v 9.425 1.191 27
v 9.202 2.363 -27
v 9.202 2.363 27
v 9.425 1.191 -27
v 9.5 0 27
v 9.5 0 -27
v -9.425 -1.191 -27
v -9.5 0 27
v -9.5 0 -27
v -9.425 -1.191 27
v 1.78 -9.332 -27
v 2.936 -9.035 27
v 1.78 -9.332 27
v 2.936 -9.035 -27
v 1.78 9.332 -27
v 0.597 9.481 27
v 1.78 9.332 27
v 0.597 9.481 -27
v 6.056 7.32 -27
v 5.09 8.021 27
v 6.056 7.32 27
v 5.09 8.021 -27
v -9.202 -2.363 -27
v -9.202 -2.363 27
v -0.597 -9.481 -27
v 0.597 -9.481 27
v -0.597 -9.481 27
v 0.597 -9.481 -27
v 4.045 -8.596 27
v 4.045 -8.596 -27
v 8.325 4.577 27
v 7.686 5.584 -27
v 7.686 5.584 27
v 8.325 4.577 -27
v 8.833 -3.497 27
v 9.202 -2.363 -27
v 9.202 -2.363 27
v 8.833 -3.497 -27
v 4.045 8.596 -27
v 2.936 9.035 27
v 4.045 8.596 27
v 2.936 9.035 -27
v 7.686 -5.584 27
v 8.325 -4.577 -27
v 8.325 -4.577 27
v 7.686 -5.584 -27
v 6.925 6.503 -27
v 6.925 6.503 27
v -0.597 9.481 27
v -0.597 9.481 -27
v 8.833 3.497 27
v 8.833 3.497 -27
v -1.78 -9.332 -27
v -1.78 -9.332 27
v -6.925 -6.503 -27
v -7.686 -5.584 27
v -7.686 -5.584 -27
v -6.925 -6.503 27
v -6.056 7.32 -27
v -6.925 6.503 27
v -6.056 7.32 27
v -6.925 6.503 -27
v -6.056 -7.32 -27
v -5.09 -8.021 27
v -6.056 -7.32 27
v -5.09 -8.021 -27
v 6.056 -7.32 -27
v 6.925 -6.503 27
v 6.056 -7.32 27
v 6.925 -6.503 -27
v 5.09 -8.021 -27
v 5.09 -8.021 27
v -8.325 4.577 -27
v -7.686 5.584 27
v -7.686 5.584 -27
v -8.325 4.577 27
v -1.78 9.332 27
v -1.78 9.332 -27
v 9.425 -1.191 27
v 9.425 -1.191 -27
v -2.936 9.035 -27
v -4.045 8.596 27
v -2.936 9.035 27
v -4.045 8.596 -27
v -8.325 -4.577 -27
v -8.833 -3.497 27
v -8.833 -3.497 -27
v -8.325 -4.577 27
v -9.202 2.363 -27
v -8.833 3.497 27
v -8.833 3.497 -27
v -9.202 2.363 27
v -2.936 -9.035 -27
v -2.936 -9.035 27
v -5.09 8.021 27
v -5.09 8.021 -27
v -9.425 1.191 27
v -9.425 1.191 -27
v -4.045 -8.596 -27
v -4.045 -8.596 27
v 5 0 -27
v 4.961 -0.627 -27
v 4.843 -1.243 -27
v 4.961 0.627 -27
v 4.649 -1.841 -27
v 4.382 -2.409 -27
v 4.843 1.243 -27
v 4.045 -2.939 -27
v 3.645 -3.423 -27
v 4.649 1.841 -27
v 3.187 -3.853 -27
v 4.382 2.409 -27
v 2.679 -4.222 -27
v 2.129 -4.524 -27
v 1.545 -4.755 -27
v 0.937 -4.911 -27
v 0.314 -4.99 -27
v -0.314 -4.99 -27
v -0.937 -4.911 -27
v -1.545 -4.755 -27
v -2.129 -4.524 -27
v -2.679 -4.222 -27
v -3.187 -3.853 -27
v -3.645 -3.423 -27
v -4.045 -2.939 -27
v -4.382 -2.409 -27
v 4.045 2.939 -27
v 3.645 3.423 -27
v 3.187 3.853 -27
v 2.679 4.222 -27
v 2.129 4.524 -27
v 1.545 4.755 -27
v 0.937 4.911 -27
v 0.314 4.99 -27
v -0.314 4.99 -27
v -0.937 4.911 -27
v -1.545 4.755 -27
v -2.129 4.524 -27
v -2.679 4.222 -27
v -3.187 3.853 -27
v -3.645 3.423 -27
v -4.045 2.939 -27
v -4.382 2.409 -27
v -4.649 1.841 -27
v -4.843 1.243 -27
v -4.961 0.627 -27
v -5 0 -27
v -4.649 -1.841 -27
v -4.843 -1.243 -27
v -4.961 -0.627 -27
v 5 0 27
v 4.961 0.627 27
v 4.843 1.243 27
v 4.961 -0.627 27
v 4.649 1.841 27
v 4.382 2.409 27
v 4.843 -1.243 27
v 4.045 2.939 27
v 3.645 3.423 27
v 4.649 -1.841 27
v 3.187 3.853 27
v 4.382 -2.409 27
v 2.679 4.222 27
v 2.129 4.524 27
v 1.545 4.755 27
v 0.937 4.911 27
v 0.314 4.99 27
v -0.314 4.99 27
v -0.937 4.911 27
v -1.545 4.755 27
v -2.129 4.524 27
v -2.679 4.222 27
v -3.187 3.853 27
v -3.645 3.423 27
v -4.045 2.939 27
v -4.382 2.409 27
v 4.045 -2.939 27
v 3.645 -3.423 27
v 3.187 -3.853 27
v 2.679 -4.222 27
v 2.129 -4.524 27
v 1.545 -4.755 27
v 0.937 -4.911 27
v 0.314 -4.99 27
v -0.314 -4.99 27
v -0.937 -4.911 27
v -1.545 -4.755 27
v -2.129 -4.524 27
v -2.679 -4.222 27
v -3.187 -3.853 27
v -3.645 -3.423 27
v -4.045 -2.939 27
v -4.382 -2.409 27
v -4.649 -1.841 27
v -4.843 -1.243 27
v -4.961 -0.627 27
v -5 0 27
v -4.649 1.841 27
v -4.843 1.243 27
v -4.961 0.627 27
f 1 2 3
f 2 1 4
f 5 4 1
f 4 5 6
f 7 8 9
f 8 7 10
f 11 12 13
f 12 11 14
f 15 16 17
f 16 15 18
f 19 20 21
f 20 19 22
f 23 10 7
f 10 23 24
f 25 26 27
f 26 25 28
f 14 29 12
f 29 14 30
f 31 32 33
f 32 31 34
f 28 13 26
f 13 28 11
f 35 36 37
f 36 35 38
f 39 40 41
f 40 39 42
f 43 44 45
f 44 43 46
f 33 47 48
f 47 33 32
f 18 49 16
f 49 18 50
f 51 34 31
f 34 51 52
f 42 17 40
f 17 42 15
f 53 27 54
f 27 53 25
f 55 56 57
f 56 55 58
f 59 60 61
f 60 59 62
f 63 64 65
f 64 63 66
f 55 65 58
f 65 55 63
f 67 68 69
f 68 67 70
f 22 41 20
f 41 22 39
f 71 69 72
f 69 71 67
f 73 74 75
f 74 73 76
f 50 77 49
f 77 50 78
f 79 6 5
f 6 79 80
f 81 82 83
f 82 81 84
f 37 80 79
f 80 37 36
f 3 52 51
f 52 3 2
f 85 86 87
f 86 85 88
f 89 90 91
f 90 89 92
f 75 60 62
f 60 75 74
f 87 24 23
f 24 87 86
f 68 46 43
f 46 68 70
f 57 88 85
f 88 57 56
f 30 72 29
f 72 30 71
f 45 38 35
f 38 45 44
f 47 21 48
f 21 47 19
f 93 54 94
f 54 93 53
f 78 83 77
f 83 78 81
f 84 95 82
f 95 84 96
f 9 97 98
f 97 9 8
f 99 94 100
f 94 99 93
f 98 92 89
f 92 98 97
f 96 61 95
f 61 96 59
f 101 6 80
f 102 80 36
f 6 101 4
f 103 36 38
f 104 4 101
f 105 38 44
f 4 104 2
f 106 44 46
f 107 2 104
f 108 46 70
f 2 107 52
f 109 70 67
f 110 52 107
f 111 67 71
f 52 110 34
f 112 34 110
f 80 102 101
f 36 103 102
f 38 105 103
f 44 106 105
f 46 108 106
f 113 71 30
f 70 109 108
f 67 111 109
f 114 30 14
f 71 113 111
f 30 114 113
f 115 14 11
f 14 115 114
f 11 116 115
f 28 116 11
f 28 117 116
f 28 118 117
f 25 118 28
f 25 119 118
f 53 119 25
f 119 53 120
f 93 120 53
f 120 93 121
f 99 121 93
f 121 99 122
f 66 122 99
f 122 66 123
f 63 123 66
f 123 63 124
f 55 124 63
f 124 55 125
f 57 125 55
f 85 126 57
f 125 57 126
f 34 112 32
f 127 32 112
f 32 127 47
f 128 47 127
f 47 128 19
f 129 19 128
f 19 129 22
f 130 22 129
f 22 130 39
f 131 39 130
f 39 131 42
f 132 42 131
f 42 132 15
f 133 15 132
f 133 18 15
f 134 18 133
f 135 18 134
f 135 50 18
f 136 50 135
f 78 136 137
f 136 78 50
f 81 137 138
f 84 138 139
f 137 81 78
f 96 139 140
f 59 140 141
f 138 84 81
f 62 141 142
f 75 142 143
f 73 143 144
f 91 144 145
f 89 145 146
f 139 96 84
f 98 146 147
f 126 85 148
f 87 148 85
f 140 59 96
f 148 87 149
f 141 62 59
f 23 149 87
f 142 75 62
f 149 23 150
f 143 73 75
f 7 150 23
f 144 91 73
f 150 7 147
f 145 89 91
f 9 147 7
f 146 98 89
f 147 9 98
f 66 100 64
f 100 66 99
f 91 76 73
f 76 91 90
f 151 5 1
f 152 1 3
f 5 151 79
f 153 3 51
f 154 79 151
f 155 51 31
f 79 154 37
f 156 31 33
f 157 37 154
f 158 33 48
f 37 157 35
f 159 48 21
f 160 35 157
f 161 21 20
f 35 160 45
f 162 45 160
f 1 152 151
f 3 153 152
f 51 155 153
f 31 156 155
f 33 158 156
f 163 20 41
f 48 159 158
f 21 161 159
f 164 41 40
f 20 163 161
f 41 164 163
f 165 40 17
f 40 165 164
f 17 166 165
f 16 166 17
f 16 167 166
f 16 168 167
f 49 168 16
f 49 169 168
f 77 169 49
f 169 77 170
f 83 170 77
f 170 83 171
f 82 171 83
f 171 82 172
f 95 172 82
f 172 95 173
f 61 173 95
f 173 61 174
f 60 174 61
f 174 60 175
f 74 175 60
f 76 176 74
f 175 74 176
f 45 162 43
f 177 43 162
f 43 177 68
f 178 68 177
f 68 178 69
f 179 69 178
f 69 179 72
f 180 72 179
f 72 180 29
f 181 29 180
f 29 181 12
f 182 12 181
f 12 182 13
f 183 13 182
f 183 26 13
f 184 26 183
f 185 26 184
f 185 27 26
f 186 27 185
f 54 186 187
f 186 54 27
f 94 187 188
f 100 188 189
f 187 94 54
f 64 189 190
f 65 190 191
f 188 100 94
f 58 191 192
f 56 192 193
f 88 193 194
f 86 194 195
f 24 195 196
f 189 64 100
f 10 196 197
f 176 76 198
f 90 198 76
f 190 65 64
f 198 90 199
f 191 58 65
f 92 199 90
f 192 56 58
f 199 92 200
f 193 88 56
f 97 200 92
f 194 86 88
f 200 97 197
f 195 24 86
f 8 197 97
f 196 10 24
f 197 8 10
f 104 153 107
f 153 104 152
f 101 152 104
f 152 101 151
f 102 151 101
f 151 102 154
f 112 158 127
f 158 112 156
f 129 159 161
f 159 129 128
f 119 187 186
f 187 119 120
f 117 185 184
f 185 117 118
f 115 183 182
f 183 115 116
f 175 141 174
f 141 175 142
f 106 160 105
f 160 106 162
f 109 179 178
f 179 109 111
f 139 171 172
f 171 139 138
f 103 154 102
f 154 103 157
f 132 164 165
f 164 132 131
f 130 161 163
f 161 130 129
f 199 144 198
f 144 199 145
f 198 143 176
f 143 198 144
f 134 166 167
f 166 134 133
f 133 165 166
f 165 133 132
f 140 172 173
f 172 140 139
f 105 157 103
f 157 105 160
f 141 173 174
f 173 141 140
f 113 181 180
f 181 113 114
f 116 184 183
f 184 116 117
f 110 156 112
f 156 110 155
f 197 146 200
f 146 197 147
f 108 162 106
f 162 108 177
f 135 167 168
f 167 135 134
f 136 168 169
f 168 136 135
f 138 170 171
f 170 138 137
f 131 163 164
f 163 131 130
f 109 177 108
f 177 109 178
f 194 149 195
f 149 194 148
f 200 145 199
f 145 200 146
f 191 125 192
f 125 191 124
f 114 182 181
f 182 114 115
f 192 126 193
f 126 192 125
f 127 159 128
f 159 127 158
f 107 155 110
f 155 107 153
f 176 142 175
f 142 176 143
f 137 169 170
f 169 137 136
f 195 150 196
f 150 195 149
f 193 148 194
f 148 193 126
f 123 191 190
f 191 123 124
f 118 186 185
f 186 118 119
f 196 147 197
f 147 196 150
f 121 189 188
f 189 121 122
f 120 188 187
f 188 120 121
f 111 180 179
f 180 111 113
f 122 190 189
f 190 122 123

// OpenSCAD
$fn = 50;


difference() {
	union() {
		translate(v = [0, 0, -27.0000000000]) {
			cylinder(h = 54, r = 9.5000000000);
		}
	}
	union() {
		translate(v = [0, 0, -100.0000000000]) {
			cylinder(h = 200, r = 5.0000000000);
		}
	}
}
